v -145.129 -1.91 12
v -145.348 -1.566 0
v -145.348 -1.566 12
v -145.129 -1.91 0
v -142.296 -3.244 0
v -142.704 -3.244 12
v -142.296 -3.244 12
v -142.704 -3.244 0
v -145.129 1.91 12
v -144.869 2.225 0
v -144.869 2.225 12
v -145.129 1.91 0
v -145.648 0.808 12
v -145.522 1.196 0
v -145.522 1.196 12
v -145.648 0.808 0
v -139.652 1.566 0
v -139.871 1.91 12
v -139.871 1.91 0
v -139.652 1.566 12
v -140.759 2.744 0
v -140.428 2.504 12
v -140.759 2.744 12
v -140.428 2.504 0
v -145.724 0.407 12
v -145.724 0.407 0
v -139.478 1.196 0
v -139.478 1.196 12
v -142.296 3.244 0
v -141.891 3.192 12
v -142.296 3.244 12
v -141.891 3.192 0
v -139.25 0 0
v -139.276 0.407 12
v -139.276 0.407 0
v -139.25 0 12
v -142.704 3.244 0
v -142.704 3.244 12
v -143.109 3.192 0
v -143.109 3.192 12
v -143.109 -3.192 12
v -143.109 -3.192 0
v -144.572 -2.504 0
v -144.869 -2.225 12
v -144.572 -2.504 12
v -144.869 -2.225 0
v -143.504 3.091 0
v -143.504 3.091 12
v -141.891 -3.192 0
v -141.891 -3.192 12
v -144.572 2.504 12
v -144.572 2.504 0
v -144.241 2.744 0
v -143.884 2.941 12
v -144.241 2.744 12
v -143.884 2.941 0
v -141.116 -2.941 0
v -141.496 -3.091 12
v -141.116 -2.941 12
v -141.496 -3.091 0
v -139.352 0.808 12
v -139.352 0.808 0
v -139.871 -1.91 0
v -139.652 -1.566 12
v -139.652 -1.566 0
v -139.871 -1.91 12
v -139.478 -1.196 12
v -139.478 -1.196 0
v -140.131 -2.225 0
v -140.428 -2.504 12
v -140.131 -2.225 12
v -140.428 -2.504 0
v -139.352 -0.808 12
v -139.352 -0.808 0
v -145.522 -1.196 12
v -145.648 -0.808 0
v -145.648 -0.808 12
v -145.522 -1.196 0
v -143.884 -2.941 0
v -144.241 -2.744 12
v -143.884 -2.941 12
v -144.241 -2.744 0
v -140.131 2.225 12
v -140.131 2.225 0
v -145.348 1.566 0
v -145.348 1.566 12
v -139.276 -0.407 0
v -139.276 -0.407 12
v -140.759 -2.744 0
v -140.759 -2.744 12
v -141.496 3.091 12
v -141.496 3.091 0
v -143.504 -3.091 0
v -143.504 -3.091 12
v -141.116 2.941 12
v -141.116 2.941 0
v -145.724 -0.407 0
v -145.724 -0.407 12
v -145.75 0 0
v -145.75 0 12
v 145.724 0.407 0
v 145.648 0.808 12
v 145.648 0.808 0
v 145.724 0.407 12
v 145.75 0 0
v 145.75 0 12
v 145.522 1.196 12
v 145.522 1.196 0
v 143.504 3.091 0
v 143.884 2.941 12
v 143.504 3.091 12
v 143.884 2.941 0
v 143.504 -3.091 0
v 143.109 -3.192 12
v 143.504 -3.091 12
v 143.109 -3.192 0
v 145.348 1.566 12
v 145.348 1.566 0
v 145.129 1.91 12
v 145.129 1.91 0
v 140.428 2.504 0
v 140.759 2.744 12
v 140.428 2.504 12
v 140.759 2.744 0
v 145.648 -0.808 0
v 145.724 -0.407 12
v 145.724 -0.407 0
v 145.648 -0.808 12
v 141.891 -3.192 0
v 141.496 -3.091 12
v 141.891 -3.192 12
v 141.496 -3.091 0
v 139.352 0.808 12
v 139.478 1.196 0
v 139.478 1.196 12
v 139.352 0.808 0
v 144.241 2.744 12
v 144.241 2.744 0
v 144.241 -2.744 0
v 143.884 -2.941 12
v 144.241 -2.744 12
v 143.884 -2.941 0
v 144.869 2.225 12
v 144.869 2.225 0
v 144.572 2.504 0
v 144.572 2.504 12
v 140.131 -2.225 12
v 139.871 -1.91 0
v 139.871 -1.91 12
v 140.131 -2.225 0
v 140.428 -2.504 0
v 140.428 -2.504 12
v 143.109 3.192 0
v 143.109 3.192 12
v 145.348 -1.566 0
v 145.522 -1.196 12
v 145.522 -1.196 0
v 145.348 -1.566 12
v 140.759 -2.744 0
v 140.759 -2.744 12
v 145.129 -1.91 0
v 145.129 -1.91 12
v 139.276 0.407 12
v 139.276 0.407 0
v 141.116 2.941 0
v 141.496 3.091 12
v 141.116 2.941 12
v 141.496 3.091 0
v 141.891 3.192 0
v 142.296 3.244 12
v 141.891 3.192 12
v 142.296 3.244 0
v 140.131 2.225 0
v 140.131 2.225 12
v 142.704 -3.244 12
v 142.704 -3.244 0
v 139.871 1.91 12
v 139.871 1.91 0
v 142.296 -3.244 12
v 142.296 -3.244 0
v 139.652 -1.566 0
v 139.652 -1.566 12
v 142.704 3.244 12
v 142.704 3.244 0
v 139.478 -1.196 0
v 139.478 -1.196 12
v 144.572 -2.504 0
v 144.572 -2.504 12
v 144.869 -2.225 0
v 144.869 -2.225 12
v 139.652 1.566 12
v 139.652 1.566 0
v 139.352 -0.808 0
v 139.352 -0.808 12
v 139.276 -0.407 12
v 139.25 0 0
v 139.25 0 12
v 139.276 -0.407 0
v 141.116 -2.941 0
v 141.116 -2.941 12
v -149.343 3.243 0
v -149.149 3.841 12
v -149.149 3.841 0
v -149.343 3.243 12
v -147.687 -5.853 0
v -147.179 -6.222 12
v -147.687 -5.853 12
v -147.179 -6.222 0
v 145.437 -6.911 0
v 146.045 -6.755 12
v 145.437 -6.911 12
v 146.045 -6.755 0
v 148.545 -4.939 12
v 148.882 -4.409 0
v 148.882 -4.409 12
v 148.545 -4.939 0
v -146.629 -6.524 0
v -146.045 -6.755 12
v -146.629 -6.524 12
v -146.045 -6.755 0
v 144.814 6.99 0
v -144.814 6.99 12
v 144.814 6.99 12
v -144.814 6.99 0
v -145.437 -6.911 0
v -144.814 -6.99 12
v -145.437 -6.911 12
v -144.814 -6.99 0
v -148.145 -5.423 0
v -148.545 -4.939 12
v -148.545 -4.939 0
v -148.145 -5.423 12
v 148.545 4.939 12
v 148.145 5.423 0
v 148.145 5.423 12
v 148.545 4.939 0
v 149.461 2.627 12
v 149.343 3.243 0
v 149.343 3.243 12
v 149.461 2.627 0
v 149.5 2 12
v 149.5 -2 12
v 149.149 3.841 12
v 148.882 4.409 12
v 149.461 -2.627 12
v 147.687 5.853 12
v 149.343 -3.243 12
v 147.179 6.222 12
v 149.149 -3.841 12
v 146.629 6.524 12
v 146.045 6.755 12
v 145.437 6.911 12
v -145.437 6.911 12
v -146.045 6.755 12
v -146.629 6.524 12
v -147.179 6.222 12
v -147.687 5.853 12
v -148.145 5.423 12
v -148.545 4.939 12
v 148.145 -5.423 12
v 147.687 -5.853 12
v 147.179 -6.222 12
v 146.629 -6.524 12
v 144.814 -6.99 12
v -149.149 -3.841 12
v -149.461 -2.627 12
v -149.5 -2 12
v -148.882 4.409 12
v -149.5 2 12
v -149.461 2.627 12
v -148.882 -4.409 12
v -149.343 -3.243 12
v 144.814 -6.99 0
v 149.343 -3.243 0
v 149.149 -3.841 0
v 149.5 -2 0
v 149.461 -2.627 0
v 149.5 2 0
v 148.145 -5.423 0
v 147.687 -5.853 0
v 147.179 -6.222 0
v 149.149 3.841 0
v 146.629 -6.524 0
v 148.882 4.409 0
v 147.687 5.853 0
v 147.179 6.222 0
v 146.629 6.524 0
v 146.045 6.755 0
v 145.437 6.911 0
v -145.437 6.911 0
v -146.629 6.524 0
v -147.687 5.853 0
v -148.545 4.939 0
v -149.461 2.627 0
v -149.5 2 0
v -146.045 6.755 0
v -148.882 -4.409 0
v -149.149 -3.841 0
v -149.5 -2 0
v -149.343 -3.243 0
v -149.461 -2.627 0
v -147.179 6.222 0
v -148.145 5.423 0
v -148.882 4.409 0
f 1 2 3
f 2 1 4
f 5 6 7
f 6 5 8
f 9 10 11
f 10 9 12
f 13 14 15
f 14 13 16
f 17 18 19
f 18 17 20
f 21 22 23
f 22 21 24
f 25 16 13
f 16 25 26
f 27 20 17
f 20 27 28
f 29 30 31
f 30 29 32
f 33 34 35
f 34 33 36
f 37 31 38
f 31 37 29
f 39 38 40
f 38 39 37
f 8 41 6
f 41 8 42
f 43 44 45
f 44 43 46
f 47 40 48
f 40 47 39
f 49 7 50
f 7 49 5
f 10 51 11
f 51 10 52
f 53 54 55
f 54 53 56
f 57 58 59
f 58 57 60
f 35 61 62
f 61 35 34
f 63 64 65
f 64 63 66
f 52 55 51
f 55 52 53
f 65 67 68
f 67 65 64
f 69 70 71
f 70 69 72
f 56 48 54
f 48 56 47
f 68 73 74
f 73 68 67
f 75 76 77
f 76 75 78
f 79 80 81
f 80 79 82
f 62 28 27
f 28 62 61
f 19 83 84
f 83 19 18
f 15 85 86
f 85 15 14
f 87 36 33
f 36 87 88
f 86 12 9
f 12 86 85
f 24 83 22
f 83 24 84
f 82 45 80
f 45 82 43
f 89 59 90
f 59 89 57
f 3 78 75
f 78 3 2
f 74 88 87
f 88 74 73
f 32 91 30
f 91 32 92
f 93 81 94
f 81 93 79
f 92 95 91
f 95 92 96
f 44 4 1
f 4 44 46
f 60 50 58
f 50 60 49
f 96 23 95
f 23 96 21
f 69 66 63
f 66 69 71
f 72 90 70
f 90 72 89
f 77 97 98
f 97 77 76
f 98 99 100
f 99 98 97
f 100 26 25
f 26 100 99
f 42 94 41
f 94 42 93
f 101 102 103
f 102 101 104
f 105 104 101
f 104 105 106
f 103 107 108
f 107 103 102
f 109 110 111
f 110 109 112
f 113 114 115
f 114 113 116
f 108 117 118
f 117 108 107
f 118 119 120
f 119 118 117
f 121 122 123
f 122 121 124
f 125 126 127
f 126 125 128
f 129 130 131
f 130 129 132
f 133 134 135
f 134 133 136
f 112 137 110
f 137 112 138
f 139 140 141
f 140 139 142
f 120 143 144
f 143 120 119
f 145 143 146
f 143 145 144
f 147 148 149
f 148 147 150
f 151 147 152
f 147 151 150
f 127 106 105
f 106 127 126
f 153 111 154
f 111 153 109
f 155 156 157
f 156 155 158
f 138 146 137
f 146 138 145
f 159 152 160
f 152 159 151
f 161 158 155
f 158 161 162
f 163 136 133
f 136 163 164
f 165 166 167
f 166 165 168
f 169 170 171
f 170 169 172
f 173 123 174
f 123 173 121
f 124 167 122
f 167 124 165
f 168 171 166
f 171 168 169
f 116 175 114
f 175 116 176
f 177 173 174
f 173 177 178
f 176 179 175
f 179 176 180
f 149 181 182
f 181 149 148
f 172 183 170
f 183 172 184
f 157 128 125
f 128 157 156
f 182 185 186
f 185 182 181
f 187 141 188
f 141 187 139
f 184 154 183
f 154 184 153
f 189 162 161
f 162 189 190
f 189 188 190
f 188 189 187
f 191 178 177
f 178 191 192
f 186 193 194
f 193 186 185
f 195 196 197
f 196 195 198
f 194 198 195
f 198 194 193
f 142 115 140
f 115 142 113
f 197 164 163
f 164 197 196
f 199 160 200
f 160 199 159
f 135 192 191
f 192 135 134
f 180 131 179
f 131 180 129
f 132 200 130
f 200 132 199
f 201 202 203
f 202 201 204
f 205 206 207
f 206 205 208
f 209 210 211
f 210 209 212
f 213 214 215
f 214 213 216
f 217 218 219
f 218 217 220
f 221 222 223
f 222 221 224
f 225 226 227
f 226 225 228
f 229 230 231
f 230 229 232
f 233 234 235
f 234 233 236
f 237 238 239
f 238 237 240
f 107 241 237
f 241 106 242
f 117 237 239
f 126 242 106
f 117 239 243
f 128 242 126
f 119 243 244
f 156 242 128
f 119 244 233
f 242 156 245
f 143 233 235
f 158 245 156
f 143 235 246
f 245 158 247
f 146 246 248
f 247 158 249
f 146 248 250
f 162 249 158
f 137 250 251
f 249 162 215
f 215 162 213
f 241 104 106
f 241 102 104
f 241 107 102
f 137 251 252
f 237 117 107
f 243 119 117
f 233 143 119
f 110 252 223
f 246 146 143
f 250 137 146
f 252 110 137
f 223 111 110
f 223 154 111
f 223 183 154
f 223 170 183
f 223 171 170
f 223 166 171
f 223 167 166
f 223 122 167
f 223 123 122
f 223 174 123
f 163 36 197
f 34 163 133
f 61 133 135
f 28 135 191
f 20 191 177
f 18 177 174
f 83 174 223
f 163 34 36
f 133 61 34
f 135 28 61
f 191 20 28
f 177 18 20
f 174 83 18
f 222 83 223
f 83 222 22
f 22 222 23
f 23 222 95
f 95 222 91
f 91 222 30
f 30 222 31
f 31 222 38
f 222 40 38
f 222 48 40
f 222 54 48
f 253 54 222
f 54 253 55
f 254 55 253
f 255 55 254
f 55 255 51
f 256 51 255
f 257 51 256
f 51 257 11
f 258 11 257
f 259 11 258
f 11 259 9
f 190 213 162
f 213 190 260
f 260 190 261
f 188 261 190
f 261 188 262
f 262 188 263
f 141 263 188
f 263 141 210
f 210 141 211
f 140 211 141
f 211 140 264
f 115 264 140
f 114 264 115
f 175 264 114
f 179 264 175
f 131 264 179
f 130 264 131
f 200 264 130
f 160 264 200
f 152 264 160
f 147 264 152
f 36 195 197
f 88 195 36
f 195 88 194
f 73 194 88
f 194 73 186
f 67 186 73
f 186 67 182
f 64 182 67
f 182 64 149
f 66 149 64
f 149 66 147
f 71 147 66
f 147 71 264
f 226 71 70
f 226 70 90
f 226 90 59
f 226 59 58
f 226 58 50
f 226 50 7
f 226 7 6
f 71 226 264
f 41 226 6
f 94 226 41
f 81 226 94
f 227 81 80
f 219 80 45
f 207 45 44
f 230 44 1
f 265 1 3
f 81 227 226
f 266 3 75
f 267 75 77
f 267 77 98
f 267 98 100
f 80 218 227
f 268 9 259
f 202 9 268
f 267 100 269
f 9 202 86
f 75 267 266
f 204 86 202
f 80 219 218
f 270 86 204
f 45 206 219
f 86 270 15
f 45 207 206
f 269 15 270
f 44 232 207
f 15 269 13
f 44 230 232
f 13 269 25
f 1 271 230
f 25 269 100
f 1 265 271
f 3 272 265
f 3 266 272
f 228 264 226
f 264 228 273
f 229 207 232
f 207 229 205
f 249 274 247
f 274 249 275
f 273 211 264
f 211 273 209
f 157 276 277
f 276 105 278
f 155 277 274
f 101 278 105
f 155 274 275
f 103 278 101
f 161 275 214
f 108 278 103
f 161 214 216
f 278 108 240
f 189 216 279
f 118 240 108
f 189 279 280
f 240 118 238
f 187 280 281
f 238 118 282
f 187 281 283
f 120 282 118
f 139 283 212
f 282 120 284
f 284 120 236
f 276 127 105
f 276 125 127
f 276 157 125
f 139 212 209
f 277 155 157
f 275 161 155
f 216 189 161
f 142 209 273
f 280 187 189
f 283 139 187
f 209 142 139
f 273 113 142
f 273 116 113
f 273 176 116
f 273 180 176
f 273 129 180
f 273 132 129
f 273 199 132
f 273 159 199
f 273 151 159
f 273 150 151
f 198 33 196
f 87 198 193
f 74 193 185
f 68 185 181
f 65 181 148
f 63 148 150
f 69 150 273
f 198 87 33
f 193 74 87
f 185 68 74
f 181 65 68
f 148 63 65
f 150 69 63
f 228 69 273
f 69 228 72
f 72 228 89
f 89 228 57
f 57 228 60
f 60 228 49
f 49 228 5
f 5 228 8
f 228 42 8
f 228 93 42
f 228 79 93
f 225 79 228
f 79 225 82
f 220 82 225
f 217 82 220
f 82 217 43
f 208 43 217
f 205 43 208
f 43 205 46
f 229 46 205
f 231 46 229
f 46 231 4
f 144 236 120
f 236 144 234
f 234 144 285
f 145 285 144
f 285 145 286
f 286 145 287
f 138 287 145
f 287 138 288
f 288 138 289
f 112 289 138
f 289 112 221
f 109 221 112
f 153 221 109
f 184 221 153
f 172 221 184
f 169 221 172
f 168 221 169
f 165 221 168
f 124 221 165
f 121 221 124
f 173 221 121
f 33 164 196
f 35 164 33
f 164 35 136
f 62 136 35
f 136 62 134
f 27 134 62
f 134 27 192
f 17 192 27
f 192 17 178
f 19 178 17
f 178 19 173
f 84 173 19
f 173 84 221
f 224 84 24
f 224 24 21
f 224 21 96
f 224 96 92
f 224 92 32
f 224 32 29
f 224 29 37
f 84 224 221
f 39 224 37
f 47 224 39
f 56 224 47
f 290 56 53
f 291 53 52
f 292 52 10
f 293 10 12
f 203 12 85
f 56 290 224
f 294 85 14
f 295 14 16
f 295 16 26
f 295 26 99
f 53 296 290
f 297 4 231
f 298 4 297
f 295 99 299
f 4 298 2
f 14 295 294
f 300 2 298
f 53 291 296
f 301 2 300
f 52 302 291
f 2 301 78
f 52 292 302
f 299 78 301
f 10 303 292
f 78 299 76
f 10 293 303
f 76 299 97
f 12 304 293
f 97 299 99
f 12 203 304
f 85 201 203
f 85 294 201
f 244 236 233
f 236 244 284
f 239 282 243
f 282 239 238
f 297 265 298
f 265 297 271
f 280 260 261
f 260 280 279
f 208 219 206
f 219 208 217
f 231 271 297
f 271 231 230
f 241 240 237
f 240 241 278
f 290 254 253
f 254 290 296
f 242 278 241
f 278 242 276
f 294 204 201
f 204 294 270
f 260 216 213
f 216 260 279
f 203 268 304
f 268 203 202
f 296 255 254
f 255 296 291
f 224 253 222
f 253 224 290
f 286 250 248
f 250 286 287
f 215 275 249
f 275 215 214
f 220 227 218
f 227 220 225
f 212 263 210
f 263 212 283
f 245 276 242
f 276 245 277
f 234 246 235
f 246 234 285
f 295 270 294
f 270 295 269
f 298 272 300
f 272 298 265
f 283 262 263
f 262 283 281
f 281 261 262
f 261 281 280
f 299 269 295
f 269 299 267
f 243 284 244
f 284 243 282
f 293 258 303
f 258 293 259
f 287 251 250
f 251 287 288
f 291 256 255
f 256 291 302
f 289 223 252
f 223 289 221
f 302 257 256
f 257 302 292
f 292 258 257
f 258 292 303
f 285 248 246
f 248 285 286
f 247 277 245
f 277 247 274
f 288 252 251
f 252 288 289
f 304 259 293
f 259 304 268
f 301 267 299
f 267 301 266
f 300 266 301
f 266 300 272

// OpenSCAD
$fn = 50;


difference() {
	union() {
		hull() {
			translate(v = [-144.5000000000, 2.0000000000, 0]) {
				cylinder(h = 12, r = 5);
			}
			translate(v = [144.5000000000, 2.0000000000, 0]) {
				cylinder(h = 12, r = 5);
			}
			translate(v = [-144.5000000000, -2.0000000000, 0]) {
				cylinder(h = 12, r = 5);
			}
			translate(v = [144.5000000000, -2.0000000000, 0]) {
				cylinder(h = 12, r = 5);
			}
		}
	}
	union() {
		translate(v = [-142.5000000000, 0.0000000000, -100.0000000000]) {
			cylinder(h = 200, r = 3.2500000000);
		}
		translate(v = [-142.5000000000, 0.0000000000, -100.0000000000]) {
			cylinder(h = 200, r = 3.2500000000);
		}
		translate(v = [142.5000000000, 0.0000000000, -100.0000000000]) {
			cylinder(h = 200, r = 3.2500000000);
		}
		translate(v = [142.5000000000, 0.0000000000, -100.0000000000]) {
			cylinder(h = 200, r = 3.2500000000);
		}
	}
}
